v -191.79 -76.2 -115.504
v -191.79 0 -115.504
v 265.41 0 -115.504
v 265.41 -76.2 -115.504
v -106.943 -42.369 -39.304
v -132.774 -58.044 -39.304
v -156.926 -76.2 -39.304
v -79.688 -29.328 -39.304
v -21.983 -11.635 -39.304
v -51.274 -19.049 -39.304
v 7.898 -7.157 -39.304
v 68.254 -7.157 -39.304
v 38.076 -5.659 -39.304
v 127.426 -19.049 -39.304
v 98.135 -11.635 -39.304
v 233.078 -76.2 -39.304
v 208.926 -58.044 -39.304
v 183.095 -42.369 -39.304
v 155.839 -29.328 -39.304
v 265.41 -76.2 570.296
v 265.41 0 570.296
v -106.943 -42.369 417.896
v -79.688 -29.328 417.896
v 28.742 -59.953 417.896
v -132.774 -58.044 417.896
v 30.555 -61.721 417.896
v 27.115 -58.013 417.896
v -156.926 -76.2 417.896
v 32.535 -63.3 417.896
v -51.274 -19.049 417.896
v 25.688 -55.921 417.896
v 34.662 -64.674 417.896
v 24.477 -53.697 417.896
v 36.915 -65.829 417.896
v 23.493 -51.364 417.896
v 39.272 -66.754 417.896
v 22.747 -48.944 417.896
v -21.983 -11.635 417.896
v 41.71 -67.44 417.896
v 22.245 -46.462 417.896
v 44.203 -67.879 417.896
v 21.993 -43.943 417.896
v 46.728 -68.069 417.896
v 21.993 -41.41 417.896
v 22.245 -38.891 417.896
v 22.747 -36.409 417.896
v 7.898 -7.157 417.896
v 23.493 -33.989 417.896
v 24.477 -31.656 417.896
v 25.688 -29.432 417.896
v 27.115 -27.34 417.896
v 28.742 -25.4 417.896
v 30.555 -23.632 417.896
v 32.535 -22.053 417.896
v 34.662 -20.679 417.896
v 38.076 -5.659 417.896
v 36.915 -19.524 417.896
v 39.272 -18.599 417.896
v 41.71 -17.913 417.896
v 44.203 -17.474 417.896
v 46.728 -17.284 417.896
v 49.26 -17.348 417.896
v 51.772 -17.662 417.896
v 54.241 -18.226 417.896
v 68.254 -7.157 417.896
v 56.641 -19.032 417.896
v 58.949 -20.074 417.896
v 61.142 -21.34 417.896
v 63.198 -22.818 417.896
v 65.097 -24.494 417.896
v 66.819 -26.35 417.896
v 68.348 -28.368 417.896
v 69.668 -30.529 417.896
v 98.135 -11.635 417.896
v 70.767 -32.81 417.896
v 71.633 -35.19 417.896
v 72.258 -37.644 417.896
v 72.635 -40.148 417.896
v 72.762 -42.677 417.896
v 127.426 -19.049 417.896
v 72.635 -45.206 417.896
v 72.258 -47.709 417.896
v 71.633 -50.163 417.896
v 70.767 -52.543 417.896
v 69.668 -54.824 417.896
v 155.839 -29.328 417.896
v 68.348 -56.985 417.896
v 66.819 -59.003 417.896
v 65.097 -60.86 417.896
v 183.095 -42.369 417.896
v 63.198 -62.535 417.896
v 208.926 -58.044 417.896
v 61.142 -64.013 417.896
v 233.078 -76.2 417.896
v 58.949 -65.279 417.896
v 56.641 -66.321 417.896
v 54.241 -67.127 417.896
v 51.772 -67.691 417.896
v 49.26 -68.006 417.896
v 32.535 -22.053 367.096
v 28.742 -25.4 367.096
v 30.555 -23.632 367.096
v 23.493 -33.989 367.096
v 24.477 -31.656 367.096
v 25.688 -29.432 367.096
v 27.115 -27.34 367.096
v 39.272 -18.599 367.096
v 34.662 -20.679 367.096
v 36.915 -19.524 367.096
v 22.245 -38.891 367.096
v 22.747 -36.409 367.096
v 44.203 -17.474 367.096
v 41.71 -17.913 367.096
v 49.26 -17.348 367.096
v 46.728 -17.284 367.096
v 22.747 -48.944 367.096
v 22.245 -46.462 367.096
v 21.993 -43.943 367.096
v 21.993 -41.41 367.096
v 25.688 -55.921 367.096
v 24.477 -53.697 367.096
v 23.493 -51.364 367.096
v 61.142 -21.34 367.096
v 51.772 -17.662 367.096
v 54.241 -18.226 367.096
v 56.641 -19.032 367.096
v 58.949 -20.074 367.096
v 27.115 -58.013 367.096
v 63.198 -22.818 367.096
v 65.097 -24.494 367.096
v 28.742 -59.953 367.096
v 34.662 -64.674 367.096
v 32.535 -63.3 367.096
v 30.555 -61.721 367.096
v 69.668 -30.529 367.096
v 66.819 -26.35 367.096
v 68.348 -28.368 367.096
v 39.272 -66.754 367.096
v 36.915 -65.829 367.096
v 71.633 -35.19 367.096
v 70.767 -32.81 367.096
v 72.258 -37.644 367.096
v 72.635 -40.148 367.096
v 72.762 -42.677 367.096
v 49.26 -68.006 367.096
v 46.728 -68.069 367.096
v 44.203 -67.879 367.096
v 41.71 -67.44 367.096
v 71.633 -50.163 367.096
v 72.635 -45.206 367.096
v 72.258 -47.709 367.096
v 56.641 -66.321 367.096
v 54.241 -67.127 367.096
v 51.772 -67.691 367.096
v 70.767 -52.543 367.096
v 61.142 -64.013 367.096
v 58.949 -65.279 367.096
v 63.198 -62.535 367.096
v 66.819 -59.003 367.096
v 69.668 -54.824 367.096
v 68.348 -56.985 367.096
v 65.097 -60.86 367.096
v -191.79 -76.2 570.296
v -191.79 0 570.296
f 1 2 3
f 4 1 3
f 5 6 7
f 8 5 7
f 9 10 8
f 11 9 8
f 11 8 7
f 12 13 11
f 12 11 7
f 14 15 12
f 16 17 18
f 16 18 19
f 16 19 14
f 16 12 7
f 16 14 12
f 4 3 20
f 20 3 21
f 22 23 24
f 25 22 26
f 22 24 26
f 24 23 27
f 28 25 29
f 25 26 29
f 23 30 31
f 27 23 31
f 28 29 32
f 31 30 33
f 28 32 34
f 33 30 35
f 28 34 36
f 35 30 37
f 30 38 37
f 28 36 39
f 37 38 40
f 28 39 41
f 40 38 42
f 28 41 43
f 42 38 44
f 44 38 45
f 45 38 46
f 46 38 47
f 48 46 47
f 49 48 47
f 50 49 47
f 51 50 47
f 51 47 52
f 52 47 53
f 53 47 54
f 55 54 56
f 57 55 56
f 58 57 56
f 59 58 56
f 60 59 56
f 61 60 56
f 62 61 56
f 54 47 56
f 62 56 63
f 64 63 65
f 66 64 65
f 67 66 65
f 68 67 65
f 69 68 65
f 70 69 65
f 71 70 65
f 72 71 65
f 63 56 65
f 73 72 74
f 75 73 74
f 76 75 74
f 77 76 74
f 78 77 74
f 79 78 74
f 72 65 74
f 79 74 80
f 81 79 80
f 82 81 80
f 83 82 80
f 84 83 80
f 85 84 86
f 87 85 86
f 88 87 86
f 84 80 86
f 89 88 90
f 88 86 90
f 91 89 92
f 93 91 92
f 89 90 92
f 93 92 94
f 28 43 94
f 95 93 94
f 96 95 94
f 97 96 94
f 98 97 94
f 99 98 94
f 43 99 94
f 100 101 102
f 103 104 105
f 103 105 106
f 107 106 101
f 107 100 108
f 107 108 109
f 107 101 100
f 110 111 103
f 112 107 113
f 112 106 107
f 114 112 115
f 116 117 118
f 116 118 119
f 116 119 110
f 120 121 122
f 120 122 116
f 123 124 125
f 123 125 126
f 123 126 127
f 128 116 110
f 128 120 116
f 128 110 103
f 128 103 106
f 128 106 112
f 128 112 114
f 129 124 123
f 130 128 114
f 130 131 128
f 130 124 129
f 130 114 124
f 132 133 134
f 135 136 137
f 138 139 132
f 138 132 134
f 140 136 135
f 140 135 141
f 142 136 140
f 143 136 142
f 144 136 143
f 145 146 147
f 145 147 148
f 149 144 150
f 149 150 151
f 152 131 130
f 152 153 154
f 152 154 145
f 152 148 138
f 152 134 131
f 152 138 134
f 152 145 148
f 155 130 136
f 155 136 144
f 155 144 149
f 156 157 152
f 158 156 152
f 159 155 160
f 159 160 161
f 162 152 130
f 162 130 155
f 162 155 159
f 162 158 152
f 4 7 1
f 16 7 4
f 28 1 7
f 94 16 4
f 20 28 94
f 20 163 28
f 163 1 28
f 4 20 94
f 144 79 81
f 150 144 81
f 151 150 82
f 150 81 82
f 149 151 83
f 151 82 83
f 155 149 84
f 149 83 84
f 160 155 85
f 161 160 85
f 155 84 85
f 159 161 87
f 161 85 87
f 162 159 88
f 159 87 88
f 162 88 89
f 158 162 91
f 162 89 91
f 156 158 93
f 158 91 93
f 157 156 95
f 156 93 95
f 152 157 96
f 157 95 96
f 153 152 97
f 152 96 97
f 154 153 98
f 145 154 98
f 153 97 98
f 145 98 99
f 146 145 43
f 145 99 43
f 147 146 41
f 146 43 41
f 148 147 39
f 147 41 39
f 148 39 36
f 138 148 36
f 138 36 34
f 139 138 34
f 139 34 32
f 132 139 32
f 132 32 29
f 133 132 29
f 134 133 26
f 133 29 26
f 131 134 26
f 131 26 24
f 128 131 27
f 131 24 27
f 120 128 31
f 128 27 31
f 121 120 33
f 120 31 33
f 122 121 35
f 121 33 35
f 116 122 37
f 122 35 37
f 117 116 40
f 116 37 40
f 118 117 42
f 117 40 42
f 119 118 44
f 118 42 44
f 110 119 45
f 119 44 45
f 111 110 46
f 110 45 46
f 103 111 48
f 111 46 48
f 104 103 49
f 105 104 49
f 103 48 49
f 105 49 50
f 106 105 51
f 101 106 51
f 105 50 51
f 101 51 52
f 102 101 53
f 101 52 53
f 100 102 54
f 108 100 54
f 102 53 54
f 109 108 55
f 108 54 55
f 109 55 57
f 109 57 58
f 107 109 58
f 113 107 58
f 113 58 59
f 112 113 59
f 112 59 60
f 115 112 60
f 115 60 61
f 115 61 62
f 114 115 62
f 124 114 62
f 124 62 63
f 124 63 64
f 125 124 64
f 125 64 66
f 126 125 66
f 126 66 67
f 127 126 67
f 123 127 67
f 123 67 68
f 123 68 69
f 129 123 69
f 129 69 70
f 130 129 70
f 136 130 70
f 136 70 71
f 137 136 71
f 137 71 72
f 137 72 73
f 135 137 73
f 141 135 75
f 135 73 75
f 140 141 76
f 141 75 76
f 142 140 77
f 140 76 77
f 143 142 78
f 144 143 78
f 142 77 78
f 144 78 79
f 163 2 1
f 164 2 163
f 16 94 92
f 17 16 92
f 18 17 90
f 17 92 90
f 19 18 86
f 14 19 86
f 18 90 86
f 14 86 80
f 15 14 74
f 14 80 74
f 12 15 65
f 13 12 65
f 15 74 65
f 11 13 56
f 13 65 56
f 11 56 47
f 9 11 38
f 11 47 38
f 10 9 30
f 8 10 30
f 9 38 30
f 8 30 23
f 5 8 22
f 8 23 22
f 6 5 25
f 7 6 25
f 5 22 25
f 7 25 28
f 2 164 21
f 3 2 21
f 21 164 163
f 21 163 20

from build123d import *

# Parameters (mm, degrees)
F0_W     = 457.2
F0_H     = 685.8
F1_DEPTH = 76.2
F3_START = -152.4
F3_DEPTH = 457.2
F4_R     = 25.4
F5_DEPTH = 50.8


with BuildPart() as f1:
    # F0 (on Front) → F1 (new body)
    with BuildSketch(Plane.XZ):
        with Locations((36.8095165998, 227.3958778115)):
            Rectangle(F0_W, F0_H)
    extrude(amount=F1_DEPTH)

    # F2 (on face) → F3 (cut)
    with BuildSketch(Plane.XY.offset(570.2958778115).offset(F3_START)):
        with BuildLine():
            Line((-156.9259542905, -76.2), (233.0776903711, -76.2))
            ThreePointArc((233.0776903711, -76.2), (38.0758680403, -5.6591071606), (-156.9259542905, -76.2))
        make_face()
    extrude(amount=-F3_DEPTH, mode=Mode.SUBTRACT)

    # F4 (on face) → F5 (join)
    with BuildSketch(Plane(origin=(0, 0, 417.8958778115), x_dir=(1, 0, 0), z_dir=(0, 0, -1))):
        with Locations((47.3616681993, 42.6765345037)):
            Circle(F4_R)
    extrude(amount=F5_DEPTH)


solid = f1.part
